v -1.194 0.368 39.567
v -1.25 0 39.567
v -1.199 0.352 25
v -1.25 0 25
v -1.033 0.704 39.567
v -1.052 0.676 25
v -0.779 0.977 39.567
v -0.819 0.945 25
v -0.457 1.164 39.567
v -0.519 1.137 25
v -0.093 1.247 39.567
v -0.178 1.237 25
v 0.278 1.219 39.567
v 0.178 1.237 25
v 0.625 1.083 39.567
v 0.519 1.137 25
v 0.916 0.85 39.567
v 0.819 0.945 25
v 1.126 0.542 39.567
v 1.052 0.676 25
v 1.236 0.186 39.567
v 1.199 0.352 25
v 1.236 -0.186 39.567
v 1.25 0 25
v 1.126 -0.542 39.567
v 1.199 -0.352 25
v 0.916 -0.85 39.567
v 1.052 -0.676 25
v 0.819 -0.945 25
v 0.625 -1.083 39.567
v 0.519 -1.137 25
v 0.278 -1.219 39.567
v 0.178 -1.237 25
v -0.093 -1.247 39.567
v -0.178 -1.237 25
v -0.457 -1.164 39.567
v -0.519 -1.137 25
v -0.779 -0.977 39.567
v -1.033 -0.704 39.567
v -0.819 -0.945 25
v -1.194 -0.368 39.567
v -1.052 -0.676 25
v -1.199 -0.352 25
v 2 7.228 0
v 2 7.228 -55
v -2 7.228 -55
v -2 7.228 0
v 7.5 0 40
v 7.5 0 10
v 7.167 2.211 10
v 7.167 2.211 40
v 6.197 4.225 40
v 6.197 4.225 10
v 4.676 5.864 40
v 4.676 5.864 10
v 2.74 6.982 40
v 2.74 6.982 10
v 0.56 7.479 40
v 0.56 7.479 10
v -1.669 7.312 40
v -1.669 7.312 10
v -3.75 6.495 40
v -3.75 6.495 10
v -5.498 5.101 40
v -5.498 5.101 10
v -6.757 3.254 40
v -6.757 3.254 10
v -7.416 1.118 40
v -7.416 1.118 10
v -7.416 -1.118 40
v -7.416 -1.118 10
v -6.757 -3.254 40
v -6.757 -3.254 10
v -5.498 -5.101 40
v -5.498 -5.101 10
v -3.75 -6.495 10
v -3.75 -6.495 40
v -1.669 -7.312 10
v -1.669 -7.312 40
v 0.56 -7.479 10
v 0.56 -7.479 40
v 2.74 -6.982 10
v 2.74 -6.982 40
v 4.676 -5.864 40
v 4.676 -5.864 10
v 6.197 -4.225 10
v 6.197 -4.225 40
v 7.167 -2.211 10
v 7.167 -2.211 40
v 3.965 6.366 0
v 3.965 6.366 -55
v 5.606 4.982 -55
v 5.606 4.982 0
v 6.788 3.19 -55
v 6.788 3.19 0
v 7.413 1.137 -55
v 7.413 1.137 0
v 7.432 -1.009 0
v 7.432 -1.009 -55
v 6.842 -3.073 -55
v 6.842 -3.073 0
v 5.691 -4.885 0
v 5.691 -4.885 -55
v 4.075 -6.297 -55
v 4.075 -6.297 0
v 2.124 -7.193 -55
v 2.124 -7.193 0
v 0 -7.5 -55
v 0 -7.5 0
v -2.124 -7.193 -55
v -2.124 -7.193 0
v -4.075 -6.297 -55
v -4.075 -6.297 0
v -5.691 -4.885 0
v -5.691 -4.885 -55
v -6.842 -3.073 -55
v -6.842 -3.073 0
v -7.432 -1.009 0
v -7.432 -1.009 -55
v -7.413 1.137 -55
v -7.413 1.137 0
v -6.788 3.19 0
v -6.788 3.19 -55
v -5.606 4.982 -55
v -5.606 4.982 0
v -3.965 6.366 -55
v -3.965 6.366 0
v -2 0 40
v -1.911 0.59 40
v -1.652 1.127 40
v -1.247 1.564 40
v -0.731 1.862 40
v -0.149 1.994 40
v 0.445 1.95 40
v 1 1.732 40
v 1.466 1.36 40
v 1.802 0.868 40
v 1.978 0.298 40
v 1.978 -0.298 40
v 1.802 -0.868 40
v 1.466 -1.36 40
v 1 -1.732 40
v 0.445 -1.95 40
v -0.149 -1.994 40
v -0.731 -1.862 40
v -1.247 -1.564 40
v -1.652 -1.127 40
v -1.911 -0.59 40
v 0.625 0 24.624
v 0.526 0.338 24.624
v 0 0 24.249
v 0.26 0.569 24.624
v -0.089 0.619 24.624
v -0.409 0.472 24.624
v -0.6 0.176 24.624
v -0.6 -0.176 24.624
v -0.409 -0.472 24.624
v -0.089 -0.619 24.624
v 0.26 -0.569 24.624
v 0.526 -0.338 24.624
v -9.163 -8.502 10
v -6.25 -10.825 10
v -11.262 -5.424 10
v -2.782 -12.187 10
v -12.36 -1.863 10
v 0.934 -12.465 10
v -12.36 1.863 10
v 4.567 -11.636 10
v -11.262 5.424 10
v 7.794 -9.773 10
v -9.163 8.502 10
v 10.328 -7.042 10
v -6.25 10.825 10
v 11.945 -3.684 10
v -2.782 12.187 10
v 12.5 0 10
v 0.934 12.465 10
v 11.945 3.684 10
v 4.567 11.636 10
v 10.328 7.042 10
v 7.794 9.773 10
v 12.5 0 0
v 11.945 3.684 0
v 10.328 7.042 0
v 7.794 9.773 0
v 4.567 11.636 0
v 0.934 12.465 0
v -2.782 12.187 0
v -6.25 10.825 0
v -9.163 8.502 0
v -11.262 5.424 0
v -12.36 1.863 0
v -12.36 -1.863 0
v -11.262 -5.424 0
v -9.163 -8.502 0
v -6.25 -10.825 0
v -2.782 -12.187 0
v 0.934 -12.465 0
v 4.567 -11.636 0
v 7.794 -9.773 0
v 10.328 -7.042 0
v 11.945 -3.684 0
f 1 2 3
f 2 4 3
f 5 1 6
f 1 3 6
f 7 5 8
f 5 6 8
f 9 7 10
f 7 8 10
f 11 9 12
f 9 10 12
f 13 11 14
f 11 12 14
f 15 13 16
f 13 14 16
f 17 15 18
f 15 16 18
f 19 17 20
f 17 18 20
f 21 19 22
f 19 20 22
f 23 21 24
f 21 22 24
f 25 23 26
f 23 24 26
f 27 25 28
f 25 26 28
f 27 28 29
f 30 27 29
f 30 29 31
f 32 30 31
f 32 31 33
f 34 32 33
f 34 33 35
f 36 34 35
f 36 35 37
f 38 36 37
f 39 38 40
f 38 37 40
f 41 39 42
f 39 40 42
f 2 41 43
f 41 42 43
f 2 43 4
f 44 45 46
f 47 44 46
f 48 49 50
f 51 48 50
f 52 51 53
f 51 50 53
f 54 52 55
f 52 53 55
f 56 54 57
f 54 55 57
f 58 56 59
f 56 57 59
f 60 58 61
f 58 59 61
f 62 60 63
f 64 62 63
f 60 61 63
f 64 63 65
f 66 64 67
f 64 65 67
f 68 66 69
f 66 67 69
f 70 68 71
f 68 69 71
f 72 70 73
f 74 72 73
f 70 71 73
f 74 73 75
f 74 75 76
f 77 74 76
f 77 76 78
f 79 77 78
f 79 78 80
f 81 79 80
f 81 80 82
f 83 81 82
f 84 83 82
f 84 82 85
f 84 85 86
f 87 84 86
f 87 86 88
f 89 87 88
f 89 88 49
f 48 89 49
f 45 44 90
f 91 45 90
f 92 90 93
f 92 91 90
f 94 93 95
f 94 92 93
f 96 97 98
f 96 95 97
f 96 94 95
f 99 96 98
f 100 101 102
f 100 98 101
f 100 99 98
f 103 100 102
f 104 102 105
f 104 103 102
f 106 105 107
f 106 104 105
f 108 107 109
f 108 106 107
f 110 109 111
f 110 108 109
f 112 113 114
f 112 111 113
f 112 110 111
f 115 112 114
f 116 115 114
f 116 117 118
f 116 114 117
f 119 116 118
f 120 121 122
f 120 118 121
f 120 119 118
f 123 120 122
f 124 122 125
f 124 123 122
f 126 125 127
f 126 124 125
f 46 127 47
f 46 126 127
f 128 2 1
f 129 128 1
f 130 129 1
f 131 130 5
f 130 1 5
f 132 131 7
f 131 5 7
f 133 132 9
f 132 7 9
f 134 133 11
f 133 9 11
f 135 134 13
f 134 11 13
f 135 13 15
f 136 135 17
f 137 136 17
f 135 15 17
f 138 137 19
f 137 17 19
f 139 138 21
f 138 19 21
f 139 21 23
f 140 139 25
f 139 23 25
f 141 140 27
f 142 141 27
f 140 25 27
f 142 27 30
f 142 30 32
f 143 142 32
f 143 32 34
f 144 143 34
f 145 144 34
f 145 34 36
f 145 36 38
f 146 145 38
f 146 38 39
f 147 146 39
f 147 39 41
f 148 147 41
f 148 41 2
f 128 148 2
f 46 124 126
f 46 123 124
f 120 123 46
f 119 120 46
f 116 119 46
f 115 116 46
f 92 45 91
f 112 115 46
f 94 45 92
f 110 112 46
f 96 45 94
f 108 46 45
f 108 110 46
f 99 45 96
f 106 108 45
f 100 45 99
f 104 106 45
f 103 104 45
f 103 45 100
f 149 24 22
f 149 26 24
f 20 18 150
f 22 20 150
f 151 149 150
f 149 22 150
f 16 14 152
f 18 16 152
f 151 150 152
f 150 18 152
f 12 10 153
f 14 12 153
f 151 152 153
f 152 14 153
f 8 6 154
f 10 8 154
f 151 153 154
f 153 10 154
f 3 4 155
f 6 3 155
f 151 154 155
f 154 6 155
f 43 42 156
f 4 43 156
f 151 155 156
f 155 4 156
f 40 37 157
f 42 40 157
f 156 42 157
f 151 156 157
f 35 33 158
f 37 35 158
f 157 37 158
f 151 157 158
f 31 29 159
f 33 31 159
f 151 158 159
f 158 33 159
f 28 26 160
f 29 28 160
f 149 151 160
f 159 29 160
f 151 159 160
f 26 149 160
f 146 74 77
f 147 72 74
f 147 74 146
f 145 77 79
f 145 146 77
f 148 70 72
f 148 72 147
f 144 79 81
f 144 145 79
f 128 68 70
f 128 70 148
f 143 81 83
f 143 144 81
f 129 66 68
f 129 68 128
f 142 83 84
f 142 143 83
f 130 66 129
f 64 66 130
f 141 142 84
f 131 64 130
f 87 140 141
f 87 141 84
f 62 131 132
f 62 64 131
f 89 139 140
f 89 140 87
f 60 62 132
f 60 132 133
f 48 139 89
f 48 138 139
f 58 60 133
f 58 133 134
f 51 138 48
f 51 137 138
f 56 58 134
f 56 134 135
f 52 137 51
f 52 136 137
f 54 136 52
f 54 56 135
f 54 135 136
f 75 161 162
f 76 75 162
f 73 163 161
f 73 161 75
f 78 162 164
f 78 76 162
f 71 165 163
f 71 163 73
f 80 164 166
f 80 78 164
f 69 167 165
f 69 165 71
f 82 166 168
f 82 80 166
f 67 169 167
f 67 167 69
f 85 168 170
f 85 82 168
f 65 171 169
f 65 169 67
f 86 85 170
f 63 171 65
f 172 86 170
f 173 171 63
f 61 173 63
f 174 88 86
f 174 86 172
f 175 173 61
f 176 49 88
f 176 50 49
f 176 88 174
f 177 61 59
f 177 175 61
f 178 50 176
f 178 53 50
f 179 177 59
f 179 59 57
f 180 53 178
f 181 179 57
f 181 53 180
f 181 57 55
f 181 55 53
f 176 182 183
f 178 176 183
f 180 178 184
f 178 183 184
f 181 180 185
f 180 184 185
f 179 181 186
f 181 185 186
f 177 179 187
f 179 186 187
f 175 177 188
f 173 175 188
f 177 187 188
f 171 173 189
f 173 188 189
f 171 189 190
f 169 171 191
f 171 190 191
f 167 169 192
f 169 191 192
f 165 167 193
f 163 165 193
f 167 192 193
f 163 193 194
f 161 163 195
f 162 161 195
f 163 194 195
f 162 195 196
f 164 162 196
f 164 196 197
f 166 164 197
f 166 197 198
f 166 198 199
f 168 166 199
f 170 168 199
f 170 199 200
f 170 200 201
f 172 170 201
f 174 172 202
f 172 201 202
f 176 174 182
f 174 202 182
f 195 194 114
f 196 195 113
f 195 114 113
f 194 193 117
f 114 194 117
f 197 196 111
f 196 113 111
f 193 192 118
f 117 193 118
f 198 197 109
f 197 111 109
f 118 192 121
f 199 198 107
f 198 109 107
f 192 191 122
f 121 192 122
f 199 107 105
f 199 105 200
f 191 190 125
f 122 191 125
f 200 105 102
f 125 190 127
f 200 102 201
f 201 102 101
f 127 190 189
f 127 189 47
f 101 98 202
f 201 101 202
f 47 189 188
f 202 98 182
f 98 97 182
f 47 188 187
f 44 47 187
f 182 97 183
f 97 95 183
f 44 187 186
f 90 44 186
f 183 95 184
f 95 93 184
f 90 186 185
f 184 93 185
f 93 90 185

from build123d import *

# Parameters (mm, degrees)
SKETCH1_R                       = 12.5
F_25MM_DIA_DEPTH                = 10
F_15MM_START                    = -10
SKETCH2_R                       = 7.5
F_15MM_DIA_BEARING_END_DEPTH    = 40
F_15MM_START_2                  = 55
SKETCH3_R                       = 7.5
F_15MM_DIA_GEAR_END_DEPTH       = 55
M3X0_5_TAPPED_HOLE1_D           = 2.5
M3X0_5_TAPPED_HOLE1_DEPTH       = 15
M3X0_5_TAPPED_HOLE1_CSINK_D     = 4
M3X0_5_TAPPED_HOLE1_CSINK_ANGLE = 120
M3X0_5_TAPPED_HOLE1_TIP         = 0.751075774
SKETCH8_W                       = 4
SKETCH8_H                       = 3.025433208
CUT_EXTRUDE1_DEPTH              = 55


with BuildPart() as part:
    # Sketch1 → 25mm dia (new body)
    with BuildSketch(Plane.XY):
        Circle(SKETCH1_R)
    extrude(amount=F_25MM_DIA_DEPTH)

    # Sketch2 → 15mm dia bearing end (add)
    with BuildSketch(Plane.XY.offset(10).offset(F_15MM_START)):
        Circle(SKETCH2_R)
    extrude(amount=F_15MM_DIA_BEARING_END_DEPTH)

    # Sketch3 → 15mm dia gear end (add)
    with BuildSketch(Plane(origin=(0, 0, 0), x_dir=(-1, 0, 0), z_dir=(0, 0, -1)).offset(F_15MM_START_2)):
        with Locations(Location((0, 0, 0), (0, 0, 180))):
            Circle(SKETCH3_R)
    extrude(amount=-F_15MM_DIA_GEAR_END_DEPTH)

    # M3x0.5 Tapped Hole1
    with Locations(Plane.XY.offset(40)):
        with Locations((0, 0)):
            CounterSinkHole(M3X0_5_TAPPED_HOLE1_D / 2, M3X0_5_TAPPED_HOLE1_CSINK_D / 2, depth=M3X0_5_TAPPED_HOLE1_DEPTH, counter_sink_angle=M3X0_5_TAPPED_HOLE1_CSINK_ANGLE)
            with Locations((0, 0, -(M3X0_5_TAPPED_HOLE1_DEPTH + M3X0_5_TAPPED_HOLE1_TIP / 2))):  # 118° drill point
                Cone(0, M3X0_5_TAPPED_HOLE1_D / 2, M3X0_5_TAPPED_HOLE1_TIP, mode=Mode.SUBTRACT)

    # Sketch8 → Cut-Extrude1 (cut)
    with BuildSketch(Plane(origin=(0, 0, -55), x_dir=(-1, 0, 0), z_dir=(0, 0, -1))):
        with Locations((0, 8.741132751)):
            Rectangle(SKETCH8_W, SKETCH8_H)
    extrude(amount=-CUT_EXTRUDE1_DEPTH, mode=Mode.SUBTRACT)


solid = part.part
